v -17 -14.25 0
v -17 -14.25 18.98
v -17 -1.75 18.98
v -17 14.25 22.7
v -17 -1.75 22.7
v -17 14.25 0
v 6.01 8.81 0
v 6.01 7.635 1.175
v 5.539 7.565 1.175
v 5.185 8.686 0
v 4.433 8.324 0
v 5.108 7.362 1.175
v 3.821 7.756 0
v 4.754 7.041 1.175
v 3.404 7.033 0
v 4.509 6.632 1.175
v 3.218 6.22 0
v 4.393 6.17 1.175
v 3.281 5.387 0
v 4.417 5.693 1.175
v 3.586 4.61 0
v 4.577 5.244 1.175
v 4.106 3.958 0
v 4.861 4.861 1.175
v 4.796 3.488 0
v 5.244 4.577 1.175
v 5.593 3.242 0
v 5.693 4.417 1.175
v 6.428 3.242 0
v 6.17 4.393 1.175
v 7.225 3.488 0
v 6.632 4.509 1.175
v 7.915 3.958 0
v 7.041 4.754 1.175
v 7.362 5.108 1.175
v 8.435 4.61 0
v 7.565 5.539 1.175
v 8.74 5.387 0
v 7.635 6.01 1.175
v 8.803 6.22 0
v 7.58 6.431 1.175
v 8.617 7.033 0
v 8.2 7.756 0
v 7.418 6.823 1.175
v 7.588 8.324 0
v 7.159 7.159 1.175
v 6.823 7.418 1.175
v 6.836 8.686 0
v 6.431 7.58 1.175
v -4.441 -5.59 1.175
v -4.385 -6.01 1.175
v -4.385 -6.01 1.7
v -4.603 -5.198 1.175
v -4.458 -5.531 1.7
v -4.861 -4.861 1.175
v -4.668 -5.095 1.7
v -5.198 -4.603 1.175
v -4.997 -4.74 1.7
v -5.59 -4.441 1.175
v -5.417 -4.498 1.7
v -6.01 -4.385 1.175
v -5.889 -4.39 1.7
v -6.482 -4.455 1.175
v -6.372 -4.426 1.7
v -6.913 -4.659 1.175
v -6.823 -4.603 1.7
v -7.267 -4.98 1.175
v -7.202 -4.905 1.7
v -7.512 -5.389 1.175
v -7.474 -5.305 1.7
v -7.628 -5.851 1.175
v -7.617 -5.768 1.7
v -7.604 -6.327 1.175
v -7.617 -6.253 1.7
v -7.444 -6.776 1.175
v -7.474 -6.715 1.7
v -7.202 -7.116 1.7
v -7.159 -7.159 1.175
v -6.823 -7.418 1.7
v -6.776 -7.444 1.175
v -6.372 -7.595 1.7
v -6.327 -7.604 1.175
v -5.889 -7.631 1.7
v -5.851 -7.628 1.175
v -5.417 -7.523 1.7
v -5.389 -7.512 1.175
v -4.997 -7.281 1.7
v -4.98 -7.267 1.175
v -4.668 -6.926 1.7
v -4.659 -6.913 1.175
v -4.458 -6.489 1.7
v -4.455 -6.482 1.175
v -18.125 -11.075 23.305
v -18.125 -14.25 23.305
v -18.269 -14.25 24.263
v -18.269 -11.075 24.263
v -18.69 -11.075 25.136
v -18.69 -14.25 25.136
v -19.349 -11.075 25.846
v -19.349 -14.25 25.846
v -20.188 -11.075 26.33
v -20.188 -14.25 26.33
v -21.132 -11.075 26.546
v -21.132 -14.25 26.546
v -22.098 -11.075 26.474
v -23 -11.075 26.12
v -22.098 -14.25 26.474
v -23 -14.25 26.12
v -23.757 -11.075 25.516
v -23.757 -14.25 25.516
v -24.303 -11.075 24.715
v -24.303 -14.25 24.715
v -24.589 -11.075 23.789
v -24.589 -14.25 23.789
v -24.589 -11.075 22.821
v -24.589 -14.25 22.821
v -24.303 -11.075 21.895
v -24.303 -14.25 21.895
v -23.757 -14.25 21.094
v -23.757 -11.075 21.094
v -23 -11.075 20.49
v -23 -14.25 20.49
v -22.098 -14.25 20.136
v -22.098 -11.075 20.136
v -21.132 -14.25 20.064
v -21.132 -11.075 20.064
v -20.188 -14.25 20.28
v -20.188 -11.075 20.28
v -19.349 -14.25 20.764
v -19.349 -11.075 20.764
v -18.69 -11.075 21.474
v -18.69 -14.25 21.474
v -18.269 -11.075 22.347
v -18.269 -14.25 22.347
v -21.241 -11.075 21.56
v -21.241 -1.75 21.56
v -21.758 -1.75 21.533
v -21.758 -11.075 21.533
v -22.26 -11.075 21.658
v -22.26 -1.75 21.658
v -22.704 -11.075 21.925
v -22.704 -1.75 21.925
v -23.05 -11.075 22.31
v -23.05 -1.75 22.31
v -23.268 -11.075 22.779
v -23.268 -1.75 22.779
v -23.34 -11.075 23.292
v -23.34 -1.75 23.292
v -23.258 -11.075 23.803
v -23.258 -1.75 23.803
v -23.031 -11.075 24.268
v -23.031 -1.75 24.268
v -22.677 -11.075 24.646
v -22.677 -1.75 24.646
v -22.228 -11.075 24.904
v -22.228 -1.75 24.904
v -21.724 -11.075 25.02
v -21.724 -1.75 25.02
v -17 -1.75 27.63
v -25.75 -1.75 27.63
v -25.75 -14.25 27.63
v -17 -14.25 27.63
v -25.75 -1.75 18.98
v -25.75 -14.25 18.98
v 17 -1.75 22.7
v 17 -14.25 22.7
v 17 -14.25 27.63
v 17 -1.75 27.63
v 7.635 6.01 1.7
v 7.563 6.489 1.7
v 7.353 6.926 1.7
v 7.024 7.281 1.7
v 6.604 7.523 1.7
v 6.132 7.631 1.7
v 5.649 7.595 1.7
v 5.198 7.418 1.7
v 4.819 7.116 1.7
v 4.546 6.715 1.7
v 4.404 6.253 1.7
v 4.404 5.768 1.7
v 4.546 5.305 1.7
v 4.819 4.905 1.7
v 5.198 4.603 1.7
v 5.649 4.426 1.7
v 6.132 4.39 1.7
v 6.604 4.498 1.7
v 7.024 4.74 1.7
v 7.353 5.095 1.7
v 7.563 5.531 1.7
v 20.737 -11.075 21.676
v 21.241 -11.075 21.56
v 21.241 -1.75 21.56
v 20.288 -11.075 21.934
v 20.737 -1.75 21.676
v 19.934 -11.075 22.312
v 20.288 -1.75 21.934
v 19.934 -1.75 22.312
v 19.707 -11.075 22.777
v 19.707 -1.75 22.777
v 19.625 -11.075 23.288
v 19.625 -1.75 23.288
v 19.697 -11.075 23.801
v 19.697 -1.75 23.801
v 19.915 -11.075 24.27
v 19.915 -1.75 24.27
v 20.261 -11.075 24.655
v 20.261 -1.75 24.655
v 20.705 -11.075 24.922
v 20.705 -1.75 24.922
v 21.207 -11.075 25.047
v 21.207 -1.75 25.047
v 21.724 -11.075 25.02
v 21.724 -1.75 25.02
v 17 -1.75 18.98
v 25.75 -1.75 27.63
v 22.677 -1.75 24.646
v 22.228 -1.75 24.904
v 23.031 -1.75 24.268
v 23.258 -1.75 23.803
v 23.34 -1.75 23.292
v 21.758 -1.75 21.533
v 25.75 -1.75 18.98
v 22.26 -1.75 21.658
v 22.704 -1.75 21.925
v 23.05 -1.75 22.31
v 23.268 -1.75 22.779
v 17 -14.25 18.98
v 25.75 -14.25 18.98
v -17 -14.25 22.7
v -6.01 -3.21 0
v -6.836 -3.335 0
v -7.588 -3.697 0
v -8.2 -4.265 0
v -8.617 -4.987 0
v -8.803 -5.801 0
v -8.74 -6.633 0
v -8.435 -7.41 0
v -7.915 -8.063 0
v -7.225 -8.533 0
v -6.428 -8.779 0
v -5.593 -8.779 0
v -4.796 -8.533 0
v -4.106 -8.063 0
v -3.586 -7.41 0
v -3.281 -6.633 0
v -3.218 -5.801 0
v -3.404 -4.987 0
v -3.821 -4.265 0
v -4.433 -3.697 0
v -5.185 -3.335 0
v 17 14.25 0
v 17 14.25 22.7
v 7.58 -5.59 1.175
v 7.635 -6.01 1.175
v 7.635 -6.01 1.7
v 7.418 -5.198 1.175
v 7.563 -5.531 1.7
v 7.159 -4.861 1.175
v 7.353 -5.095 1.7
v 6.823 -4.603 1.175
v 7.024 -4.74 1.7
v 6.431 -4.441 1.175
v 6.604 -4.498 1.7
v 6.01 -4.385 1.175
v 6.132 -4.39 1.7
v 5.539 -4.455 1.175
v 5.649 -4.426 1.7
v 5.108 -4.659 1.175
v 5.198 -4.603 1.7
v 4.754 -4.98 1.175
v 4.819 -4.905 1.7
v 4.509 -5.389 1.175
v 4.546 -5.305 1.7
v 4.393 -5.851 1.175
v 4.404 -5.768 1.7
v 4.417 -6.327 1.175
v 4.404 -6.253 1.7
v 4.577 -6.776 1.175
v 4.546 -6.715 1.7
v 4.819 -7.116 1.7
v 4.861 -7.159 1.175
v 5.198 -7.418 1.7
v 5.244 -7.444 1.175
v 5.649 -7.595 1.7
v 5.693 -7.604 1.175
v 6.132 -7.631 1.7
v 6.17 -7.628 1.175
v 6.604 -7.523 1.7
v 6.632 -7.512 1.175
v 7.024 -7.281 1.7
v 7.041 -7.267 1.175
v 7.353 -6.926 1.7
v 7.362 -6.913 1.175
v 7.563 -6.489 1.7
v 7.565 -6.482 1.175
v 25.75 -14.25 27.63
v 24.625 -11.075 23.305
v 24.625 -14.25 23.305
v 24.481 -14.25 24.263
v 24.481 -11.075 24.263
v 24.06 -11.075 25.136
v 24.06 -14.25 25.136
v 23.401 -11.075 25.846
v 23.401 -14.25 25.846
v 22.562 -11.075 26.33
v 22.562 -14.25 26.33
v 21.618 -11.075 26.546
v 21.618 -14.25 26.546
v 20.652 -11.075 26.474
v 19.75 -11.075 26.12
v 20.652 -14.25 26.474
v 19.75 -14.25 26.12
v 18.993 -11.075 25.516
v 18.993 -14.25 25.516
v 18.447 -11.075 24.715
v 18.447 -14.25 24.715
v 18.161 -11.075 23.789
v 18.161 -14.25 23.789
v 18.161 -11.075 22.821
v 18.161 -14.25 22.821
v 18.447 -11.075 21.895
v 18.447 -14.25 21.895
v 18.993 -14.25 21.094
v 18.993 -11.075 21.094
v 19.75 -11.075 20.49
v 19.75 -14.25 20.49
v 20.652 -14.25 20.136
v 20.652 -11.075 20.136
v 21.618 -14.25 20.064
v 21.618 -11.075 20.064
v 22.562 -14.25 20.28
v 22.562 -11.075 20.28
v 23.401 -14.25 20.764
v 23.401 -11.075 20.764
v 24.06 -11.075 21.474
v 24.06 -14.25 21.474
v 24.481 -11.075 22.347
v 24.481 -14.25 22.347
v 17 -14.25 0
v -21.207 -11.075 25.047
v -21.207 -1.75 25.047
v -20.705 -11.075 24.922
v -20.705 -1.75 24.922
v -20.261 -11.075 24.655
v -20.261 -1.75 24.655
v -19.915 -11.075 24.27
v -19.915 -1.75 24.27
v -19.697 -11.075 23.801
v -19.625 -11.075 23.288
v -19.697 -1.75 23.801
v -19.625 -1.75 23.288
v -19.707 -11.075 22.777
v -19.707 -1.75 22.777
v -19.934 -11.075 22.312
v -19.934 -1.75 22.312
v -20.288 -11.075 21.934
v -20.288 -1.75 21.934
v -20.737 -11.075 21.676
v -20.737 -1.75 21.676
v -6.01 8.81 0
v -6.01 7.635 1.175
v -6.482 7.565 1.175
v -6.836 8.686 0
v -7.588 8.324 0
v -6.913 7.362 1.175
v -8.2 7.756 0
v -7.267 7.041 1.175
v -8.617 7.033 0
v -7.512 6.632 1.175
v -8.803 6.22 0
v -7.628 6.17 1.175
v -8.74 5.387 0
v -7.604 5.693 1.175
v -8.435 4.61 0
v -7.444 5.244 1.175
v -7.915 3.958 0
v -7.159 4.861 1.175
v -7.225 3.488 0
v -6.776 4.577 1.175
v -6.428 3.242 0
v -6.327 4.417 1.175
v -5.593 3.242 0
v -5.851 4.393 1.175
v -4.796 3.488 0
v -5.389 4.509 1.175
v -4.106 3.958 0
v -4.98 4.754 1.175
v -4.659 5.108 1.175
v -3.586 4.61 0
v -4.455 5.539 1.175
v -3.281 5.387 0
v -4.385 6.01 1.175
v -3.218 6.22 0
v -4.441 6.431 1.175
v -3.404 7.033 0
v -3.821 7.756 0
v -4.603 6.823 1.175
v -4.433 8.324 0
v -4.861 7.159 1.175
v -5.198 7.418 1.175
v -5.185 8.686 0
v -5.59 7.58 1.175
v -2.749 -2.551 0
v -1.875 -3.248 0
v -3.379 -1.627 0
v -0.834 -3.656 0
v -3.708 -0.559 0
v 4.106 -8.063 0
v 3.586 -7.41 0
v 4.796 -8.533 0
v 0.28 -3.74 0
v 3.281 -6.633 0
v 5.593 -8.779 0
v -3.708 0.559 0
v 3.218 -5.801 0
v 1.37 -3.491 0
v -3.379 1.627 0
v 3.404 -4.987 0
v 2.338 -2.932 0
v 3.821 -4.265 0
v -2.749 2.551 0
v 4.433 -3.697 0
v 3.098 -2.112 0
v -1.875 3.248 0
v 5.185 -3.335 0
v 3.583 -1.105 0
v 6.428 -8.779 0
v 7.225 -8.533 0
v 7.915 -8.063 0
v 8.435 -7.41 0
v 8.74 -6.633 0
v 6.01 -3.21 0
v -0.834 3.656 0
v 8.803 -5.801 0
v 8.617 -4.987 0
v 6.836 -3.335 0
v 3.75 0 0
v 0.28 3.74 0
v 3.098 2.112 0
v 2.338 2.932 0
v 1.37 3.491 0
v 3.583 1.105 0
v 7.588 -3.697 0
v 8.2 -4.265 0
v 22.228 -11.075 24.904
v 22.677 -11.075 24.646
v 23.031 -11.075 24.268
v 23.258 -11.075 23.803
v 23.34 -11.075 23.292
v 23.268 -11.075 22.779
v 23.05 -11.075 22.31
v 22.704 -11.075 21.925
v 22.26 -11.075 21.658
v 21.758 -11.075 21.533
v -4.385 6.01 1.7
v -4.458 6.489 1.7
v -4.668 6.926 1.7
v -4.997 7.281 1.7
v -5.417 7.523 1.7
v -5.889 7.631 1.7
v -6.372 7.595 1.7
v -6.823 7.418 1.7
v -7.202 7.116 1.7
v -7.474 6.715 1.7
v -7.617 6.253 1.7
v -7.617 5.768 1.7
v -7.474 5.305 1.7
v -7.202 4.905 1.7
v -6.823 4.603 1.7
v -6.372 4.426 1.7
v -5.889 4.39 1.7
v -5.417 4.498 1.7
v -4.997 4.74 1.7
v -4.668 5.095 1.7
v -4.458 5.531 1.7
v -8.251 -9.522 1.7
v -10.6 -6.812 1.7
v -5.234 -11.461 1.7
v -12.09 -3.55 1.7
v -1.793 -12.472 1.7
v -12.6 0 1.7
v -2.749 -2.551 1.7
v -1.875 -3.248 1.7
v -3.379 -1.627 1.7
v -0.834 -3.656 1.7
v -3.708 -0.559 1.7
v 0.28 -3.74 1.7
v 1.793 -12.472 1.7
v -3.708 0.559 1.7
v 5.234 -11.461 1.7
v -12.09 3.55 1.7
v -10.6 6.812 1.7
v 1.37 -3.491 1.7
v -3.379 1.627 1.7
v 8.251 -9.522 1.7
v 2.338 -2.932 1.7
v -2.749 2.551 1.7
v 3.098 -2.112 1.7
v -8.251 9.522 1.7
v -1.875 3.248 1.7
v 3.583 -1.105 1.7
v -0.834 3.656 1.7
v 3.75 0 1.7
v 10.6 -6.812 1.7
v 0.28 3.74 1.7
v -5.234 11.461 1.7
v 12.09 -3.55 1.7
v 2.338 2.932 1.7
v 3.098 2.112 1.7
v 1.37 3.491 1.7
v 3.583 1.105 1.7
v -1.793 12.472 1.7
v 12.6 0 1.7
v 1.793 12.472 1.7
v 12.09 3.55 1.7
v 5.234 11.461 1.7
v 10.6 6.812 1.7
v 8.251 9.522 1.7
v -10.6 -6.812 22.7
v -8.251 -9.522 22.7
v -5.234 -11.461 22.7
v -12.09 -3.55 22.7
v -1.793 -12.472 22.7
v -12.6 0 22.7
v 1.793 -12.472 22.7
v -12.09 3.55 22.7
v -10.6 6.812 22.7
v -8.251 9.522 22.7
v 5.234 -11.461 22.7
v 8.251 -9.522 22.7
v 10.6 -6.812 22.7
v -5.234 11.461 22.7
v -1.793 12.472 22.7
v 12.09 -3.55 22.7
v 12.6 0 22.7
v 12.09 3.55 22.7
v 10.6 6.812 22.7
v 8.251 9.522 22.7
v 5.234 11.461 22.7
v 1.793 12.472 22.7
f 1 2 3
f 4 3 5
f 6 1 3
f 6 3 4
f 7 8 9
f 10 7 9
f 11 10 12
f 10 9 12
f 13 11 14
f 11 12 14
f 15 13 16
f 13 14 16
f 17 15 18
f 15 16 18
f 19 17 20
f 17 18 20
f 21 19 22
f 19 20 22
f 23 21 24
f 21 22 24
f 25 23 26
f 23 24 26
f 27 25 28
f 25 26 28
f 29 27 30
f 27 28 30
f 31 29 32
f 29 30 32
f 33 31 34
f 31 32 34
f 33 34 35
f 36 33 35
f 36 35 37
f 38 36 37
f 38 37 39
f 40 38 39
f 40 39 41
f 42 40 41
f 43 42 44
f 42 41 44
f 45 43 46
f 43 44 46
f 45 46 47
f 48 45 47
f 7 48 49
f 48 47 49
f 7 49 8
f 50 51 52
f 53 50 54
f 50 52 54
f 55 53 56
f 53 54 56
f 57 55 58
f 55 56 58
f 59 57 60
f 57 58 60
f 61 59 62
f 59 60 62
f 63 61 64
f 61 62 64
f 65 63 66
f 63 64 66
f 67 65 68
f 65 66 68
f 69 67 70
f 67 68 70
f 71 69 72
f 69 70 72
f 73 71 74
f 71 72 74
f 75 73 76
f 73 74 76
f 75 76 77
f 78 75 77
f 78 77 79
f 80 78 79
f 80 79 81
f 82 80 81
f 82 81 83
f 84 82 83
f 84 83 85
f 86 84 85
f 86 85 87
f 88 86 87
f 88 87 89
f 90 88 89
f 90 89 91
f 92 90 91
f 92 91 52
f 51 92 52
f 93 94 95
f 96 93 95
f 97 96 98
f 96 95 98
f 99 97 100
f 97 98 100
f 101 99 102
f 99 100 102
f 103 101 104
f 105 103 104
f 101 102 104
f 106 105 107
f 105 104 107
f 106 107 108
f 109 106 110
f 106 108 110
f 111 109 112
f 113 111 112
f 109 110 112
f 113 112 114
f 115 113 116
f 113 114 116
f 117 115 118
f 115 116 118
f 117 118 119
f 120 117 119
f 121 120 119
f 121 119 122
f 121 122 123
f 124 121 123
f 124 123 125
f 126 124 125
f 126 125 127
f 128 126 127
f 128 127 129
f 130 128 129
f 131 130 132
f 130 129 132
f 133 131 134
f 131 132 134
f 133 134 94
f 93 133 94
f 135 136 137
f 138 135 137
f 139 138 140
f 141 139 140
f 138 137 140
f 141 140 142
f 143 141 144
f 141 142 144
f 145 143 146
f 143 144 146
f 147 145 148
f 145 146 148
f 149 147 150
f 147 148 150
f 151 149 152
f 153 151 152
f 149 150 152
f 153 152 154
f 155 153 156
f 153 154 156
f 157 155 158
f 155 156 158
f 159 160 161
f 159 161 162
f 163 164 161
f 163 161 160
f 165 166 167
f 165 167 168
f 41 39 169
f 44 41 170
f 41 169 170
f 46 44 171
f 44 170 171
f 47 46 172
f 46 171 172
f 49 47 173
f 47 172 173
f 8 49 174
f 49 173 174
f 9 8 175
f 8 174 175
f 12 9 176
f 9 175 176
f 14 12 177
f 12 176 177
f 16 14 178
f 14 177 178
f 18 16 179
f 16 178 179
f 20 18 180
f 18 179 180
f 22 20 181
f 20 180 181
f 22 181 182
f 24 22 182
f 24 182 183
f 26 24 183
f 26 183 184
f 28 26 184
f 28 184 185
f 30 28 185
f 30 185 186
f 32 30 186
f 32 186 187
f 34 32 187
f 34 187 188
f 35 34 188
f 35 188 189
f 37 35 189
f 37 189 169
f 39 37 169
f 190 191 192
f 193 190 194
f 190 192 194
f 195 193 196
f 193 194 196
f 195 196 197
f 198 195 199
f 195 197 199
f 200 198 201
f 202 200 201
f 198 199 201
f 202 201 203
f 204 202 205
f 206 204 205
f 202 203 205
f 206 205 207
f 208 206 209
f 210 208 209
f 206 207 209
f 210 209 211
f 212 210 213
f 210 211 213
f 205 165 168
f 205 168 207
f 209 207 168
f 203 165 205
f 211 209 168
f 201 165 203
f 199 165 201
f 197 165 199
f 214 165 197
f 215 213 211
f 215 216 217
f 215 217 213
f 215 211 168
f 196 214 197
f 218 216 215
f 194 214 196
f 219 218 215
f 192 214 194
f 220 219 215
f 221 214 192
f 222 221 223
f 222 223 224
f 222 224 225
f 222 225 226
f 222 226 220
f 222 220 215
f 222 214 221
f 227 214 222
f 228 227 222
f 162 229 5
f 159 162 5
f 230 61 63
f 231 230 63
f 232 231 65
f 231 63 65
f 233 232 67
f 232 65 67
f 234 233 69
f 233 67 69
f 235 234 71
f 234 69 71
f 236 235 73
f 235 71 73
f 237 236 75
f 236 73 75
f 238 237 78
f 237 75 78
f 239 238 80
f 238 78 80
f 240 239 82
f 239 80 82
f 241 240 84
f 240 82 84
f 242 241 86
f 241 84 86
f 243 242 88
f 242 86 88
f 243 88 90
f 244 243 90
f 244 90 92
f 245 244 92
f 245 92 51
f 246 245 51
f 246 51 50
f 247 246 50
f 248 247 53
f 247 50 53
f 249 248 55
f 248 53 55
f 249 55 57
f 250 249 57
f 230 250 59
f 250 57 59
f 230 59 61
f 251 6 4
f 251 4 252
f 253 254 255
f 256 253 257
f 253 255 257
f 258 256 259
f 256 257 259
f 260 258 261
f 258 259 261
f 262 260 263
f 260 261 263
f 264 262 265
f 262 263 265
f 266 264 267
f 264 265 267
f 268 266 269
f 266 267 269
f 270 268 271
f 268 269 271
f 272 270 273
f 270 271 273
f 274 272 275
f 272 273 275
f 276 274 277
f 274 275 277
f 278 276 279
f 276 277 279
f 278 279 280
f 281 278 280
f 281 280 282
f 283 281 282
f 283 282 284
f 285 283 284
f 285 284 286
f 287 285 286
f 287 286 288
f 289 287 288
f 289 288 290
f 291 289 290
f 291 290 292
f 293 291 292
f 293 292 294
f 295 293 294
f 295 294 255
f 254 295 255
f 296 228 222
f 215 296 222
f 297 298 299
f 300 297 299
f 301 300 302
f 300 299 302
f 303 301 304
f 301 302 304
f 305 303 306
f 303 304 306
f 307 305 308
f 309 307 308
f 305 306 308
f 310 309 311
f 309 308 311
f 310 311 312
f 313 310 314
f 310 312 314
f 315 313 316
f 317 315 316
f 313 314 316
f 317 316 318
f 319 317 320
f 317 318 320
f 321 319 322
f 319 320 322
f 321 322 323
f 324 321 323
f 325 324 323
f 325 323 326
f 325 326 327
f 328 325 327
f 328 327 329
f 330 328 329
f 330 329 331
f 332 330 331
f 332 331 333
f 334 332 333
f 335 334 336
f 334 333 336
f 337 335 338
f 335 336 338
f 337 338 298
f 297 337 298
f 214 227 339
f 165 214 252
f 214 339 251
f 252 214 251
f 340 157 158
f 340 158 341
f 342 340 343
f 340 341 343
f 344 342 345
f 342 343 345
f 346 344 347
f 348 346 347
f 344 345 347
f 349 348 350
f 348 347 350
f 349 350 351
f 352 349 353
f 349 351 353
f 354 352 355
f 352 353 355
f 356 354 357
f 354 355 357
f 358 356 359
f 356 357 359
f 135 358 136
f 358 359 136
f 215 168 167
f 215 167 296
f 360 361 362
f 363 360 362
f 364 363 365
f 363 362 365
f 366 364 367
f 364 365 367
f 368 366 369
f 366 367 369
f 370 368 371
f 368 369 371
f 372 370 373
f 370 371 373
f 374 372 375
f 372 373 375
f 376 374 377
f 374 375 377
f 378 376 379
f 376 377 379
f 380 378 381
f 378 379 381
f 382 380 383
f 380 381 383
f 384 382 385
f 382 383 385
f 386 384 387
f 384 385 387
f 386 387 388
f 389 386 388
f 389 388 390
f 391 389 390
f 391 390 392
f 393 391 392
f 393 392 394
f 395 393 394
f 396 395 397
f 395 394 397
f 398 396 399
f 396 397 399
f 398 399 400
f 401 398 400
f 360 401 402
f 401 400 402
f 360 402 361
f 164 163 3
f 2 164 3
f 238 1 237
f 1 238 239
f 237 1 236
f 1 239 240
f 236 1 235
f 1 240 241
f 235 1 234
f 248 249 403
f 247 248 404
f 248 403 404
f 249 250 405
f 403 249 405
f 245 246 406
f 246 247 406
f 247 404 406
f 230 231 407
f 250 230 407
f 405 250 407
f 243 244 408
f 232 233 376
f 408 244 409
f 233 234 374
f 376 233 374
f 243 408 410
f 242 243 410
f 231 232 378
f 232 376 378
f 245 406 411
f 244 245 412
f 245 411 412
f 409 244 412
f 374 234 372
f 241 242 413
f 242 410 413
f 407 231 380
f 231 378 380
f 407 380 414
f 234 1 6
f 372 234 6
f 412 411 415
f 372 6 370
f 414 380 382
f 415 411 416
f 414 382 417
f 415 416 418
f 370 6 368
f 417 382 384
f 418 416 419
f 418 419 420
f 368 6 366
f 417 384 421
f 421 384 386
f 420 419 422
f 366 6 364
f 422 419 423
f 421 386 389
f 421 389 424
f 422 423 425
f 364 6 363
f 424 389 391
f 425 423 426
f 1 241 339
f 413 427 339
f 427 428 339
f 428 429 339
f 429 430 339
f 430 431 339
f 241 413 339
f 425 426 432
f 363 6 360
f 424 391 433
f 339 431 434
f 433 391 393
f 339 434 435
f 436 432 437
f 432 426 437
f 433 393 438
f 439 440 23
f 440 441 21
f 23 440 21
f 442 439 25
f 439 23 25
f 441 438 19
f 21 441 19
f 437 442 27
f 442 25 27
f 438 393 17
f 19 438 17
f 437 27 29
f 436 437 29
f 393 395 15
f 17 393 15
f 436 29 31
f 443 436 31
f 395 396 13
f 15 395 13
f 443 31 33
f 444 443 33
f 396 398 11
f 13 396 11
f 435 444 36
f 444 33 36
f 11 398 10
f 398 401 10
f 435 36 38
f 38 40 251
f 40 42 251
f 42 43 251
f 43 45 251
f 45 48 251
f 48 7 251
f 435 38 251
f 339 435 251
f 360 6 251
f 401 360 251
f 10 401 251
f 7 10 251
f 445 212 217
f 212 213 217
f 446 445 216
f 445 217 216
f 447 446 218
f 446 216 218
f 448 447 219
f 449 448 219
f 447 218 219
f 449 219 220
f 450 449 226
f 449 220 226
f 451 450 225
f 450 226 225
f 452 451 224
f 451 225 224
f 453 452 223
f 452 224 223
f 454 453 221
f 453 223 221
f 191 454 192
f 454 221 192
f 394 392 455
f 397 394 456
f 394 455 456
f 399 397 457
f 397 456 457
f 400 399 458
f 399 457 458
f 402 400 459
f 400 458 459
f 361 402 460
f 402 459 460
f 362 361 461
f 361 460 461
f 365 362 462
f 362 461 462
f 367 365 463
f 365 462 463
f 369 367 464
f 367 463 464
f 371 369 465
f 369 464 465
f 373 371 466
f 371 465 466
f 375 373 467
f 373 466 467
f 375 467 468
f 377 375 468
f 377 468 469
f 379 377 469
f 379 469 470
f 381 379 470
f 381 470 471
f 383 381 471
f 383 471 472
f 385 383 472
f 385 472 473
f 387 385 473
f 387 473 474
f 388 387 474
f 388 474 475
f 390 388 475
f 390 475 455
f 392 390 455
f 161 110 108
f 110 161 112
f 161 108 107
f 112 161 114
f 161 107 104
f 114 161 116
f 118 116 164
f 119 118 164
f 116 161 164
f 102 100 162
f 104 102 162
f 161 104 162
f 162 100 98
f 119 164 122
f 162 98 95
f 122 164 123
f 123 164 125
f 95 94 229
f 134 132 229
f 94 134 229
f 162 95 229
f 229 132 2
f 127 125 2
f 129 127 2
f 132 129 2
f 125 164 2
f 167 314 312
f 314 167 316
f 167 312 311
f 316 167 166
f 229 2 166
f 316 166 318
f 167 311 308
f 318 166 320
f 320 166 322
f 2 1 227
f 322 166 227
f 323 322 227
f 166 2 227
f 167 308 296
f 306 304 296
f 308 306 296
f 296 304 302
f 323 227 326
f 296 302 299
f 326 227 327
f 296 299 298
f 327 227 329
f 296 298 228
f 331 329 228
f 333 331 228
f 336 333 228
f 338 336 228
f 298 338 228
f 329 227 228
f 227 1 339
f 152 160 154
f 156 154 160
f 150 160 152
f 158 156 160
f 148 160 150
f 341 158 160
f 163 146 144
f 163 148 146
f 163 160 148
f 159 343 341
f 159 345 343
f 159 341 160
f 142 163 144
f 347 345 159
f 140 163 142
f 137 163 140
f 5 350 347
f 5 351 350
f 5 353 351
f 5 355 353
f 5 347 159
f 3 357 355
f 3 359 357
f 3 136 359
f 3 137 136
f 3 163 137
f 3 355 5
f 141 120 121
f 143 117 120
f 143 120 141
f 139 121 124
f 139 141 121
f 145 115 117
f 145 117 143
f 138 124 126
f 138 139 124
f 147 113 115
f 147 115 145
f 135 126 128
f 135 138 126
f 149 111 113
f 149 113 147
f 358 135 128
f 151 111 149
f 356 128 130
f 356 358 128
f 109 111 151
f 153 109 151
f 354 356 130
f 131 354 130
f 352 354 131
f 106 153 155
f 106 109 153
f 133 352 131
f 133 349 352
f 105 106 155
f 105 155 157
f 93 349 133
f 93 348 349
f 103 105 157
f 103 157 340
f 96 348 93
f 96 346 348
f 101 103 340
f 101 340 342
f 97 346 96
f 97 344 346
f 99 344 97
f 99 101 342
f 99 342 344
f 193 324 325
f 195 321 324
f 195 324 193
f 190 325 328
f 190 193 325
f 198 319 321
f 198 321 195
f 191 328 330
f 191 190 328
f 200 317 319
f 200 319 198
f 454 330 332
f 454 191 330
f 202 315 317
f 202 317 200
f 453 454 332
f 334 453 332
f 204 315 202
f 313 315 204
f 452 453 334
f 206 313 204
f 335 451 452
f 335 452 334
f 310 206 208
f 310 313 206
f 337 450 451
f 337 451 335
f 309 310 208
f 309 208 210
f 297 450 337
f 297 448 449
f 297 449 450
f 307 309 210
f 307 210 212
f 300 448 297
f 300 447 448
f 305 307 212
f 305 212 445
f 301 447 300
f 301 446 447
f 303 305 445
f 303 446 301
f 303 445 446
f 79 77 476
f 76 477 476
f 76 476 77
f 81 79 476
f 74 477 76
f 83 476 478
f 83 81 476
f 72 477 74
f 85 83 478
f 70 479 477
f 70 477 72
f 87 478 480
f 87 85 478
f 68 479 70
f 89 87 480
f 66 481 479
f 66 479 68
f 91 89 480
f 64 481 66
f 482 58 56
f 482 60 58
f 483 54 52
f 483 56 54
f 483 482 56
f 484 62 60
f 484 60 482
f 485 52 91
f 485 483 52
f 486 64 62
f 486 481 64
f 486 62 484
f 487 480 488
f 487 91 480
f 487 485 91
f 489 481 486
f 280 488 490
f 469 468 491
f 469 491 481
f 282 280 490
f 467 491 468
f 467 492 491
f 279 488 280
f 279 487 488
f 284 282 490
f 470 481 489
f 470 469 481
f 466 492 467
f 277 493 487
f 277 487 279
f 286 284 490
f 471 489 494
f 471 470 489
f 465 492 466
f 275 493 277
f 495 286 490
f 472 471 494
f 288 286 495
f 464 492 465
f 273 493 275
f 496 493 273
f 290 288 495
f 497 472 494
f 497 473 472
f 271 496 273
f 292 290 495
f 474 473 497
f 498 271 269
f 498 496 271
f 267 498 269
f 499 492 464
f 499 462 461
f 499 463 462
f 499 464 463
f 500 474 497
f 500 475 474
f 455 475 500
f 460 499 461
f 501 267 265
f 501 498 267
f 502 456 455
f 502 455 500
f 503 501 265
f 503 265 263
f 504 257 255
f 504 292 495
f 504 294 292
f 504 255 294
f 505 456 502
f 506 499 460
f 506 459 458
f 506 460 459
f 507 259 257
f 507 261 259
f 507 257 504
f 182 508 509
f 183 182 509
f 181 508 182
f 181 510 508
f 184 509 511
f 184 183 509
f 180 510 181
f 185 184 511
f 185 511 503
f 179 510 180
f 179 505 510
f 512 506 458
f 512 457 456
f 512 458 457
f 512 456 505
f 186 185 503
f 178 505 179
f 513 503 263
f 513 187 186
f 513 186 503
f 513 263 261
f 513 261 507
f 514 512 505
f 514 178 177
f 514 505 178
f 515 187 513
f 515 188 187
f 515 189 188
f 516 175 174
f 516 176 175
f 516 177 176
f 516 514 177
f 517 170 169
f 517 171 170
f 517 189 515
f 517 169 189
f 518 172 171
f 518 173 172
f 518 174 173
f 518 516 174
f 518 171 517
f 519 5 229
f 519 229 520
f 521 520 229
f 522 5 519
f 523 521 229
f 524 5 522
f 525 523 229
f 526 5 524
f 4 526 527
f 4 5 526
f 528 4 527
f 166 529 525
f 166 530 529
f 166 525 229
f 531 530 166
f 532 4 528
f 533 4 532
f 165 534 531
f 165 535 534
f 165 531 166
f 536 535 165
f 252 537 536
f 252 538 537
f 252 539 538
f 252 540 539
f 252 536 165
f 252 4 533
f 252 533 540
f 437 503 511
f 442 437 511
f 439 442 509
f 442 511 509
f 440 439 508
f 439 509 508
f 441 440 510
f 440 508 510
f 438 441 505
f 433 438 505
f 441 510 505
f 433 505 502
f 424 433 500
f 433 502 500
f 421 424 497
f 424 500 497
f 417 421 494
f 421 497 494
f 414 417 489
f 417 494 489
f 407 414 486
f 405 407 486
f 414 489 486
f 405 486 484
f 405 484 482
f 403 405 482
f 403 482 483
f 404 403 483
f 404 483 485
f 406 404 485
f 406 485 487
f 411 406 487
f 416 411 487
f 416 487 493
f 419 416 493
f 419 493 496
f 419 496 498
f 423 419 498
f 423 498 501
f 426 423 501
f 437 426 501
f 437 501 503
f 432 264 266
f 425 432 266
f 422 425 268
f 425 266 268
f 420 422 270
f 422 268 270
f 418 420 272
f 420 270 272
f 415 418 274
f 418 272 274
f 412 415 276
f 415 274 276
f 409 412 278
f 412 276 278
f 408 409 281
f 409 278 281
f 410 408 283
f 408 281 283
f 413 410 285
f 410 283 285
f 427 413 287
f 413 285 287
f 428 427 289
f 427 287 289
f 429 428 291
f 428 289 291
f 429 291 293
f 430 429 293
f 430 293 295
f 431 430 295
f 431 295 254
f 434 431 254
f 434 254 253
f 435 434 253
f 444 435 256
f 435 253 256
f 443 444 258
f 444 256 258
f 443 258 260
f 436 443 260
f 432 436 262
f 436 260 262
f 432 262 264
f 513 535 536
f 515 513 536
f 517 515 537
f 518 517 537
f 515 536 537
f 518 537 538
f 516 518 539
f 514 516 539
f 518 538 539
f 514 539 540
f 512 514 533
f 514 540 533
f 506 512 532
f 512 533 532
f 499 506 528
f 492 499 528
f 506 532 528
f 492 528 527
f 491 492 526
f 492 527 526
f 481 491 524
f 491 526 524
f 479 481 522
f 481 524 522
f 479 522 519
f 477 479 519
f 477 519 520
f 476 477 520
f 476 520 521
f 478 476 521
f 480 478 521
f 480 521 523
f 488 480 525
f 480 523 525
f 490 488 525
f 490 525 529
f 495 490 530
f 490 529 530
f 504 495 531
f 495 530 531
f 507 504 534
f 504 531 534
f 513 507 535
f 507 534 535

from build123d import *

# Parameters (mm, degrees)
SKETCH1_W                = 34
SKETCH1_H                = 28.5
BOSS_EXTRUDE1_DEPTH      = 22.7
SKETCH3_R                = 12.6
CUT_EXTRUDE1_DEPTH       = 21
SKETCH5_R                = 1.625
SKETCH5_R_2              = 3.75
CUT_EXTRUDE2_DEPTH       = 31.546071761
BOSS_EXTRUDE2_DEPTH      = 4.93
BOSS_EXTRUDE2_DEPTH_BACK = 3.72
SKETCH7_W                = 8.75
SKETCH7_H                = 12.5
SKETCH8_R                = 1.75
CUT_EXTRUDE3_DEPTH       = 42.018037496
SKETCH9_R                = 3.25
CUT_EXTRUDE4_DEPTH       = 3.175
SKETCH14_R               = 1.75
CUT_EXTRUDE8_DEPTH       = 50


with BuildPart() as part:
    # Sketch1 → Boss-Extrude1 (new body)
    with BuildSketch(Plane.XY):
        Rectangle(SKETCH1_W, SKETCH1_H)
    extrude(amount=BOSS_EXTRUDE1_DEPTH)

    # Sketch3 → Cut-Extrude1 (cut)
    with BuildSketch(Plane.XY.offset(22.7)):
        Circle(SKETCH3_R)
    extrude(amount=-CUT_EXTRUDE1_DEPTH, mode=Mode.SUBTRACT)

    # Sketch5 → Cut-Extrude2 (cut, through all)
    with BuildSketch(Plane.XY.offset(1.7)):
        with Locations((6.01040764, 6.01040764)):
            Circle(SKETCH5_R)
        with Locations((-6.01040764, 6.01040764)):
            Circle(SKETCH5_R)
        with Locations((6.01040764, -6.01040764)):
            Circle(SKETCH5_R)
        with Locations((-6.01040764, -6.01040764)):
            Circle(SKETCH5_R)
        Circle(SKETCH5_R_2)
    extrude(amount=-CUT_EXTRUDE2_DEPTH, mode=Mode.SUBTRACT)

    # Sketch7 → Boss-Extrude2 (add, two sides: drawn at the far end of the back side and taken through both)
    with BuildSketch(Plane.XY.offset(22.7).offset(-BOSS_EXTRUDE2_DEPTH_BACK)):
        with Locations((-21.375, -8)):
            Rectangle(SKETCH7_W, SKETCH7_H)
        with Locations((21.375, -8)):
            Rectangle(SKETCH7_W, SKETCH7_H)
    extrude(amount=BOSS_EXTRUDE2_DEPTH + BOSS_EXTRUDE2_DEPTH_BACK)

    # Sketch8 → Cut-Extrude3 (cut, through all)
    with BuildSketch(Plane(origin=(0, -1.75, 0), x_dir=(1, 0, 0), z_dir=(0, 1, 0))):
        with Locations(Location((21.375, -23.305, 0), (0, 0, 180))):
            Circle(SKETCH8_R)
        with Locations(Location((-21.375, -23.305, 0), (0, 0, 180))):
            Circle(SKETCH8_R)
    extrude(amount=-CUT_EXTRUDE3_DEPTH, mode=Mode.SUBTRACT)

    # Sketch9 → Cut-Extrude4 (cut)
    with BuildSketch(Plane.XZ.offset(14.25)):
        with Locations((-21.375, 23.305)):
            Circle(SKETCH9_R)
        with Locations((21.375, 23.305)):
            Circle(SKETCH9_R)
    extrude(amount=-CUT_EXTRUDE4_DEPTH, mode=Mode.SUBTRACT)

    # Cut-Extrude5 cone 1 section (through the dimple's axis) → Cut-Extrude5 (revolve, cut)
    with BuildSketch(Plane(origin=(-6.01040764, 6.01040764, 0), x_dir=(0, 1, 0), z_dir=(1, 0, 0))):
        Polygon((0, 0), (2.8, 0), (0, 2.8), align=None)
    revolve(axis=Axis((-6.01040764, 6.01040764, 0), (0, 0, 1)), mode=Mode.SUBTRACT)

    # Cut-Extrude5 cone 2 section (through the dimple's axis) → Cut-Extrude5 cone 2 (revolve, cut)
    with BuildSketch(Plane(origin=(-6.01040764, -6.01040764, 0), x_dir=(0, 1, 0), z_dir=(1, 0, 0))):
        Polygon((0, 0), (2.8, 0), (0, 2.8), align=None)
    revolve(axis=Axis((-6.01040764, -6.01040764, 0), (0, 0, 1)), mode=Mode.SUBTRACT)

    # Cut-Extrude5 cone 3 section (through the dimple's axis) → Cut-Extrude5 cone 3 (revolve, cut)
    with BuildSketch(Plane(origin=(6.01040764, -6.01040764, 0), x_dir=(0, 1, 0), z_dir=(1, 0, 0))):
        Polygon((0, 0), (2.8, 0), (0, 2.8), align=None)
    revolve(axis=Axis((6.01040764, -6.01040764, 0), (0, 0, 1)), mode=Mode.SUBTRACT)

    # Cut-Extrude5 cone 4 section (through the dimple's axis) → Cut-Extrude5 cone 4 (revolve, cut)
    with BuildSketch(Plane(origin=(6.01040764, 6.01040764, 0), x_dir=(0, 1, 0), z_dir=(1, 0, 0))):
        Polygon((0, 0), (2.8, 0), (0, 2.8), align=None)
    revolve(axis=Axis((6.01040764, 6.01040764, 0), (0, 0, 1)), mode=Mode.SUBTRACT)

    # Sketch14 → Cut-Extrude8 (cut)
    with BuildSketch(Plane(origin=(132.323959999, 1.25, 25.756345109), x_dir=(1, 0, 0), z_dir=(0, 1, 0))):
        with Locations((-110.733959999, 2.481345109)):
            Circle(SKETCH14_R)
        with Locations((-153.913959999, 2.481345109)):
            Circle(SKETCH14_R)
    extrude(amount=-CUT_EXTRUDE8_DEPTH, mode=Mode.SUBTRACT)


solid = part.part
